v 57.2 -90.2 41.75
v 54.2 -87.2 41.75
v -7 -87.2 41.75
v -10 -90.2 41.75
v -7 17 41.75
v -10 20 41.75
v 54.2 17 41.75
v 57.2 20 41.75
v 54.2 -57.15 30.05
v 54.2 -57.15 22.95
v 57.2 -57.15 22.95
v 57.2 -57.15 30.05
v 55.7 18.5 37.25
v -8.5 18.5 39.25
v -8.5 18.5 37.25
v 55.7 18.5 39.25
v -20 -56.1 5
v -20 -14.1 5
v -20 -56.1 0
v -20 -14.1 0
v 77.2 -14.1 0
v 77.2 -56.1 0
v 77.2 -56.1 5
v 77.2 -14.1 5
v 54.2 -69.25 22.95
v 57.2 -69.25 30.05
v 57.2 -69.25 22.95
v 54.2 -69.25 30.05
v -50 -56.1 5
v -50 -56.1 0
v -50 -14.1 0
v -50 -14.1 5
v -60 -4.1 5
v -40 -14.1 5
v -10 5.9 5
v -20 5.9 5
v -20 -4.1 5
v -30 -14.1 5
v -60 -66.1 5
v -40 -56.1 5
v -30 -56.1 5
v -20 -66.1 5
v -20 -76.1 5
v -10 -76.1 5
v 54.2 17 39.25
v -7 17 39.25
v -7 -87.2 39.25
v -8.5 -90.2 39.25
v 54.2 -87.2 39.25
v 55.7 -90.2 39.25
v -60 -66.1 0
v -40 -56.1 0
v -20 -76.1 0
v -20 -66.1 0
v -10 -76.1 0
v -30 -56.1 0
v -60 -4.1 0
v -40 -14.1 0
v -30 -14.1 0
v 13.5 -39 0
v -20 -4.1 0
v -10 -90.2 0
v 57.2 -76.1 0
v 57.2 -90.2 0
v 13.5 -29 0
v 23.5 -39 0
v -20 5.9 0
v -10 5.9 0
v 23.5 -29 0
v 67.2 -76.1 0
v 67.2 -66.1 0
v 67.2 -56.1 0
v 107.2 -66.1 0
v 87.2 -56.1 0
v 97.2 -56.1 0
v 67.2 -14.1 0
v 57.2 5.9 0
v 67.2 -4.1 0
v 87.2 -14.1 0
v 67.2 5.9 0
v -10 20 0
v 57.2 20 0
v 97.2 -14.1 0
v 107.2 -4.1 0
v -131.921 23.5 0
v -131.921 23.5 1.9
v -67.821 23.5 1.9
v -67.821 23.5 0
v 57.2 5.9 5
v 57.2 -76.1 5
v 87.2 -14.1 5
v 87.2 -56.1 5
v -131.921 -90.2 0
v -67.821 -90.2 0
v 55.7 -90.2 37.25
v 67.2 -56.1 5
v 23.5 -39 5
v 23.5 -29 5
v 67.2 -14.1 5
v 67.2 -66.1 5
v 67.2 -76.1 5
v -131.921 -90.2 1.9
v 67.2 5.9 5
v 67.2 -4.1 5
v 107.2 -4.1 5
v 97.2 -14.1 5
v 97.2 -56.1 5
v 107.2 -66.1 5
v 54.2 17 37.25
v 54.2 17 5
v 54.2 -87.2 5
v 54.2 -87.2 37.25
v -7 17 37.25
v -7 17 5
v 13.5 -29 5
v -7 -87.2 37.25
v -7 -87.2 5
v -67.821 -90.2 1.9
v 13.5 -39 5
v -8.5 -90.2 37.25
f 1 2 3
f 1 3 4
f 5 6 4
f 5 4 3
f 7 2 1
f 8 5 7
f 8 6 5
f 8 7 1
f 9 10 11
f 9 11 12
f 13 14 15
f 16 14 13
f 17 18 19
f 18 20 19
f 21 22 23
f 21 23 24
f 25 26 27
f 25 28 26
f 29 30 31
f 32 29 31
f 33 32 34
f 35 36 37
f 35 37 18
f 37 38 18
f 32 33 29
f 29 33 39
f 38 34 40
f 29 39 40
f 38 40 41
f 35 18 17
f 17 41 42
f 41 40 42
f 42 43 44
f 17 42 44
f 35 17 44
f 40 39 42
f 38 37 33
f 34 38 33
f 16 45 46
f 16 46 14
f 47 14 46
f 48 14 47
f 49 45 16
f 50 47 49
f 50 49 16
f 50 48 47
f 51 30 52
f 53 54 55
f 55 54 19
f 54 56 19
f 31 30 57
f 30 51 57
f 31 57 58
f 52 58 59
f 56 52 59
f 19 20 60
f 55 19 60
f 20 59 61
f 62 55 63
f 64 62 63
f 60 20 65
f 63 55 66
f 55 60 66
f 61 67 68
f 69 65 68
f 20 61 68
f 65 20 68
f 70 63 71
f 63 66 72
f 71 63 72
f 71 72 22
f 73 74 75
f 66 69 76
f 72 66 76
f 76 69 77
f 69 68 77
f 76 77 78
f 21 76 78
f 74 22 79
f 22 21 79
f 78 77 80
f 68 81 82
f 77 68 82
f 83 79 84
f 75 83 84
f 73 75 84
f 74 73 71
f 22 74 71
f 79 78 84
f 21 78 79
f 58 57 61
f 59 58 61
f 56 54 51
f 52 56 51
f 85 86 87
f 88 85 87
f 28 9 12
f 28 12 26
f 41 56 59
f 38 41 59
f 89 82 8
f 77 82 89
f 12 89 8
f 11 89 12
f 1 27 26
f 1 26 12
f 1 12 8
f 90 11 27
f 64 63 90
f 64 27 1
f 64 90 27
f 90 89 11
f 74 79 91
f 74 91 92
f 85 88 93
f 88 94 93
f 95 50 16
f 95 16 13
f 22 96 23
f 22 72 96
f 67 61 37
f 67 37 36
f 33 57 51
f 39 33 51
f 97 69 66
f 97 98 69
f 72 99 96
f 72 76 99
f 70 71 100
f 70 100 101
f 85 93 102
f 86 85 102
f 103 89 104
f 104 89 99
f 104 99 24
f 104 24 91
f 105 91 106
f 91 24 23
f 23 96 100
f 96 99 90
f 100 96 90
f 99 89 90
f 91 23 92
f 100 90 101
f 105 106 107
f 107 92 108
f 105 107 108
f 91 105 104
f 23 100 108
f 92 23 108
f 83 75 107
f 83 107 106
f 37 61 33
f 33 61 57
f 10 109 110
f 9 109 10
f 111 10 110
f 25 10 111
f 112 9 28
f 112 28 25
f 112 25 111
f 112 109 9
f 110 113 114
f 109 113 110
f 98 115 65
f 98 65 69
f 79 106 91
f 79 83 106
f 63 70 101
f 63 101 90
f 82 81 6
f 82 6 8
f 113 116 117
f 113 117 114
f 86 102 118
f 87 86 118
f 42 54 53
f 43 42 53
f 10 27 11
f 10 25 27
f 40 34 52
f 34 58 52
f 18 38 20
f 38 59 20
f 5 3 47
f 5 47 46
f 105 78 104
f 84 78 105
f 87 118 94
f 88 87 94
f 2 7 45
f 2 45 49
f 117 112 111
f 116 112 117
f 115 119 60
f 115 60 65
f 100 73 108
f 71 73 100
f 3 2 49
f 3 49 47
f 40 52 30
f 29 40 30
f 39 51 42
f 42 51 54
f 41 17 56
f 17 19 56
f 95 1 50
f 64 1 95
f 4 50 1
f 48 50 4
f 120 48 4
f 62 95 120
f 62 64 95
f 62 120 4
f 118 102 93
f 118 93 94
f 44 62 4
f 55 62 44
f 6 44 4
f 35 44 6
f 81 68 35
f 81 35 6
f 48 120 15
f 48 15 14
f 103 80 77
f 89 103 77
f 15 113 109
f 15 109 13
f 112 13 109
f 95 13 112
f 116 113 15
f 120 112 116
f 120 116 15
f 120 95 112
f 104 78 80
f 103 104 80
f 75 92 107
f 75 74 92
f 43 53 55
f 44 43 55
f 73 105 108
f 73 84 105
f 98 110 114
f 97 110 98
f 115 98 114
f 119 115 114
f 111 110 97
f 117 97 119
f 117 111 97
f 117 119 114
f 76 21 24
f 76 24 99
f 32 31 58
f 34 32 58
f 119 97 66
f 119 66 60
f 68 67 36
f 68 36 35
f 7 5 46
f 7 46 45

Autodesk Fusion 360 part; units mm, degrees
sketch "Sketch1" plane through (0, 0, 0) normal (0, 0, 1) x (1, 0, 0)
  line L0 (-10, 20) -> (57.2, 20)
  line L1 (57.2, 20) -> (57.2, -90.2)
  line L2 (57.2, -90.2) -> (-10, -90.2)
  line L3 (-10, -90.2) -> (-10, 20)
  dimension "d1" = 67.2
  dimension "d2" = 110.2
extrude "Extrude1" add sketch "Sketch1" along normal blind 41.75 makes body 1
sketch "Sketch2" plane through (0, 0, 41.75) normal (0, 0, 1) x (-1, 0, 0)
  line L0 (10, 90.2) -> (-57.2, 90.2)
  line L1 (-57.2, 90.2) -> (-57.2, -20)
  line L2 (-57.2, -20) -> (10, -20)
  line L3 (10, -20) -> (10, 90.2)
  line L4 (7, -17) -> (-54.2, -17)
  line L5 (-54.2, -17) -> (-54.2, 87.2)
  line L6 (-54.2, 87.2) -> (7, 87.2)
  line L7 (7, 87.2) -> (7, -17)
  dimension "d10" = 61.2
  dimension "d11" = 104.2
  dimension "d12" = 3
  dimension "d13" = 3
extrude "Extrude3" cut sketch "Sketch2" against normal blind 36.75 contours L4 L5 L6 L7 bodies 1
sketch "Sketch4" plane through (0, -90.2, 0) normal (0, -1, 0) x (1, 0, 0)
  line L0 (-10, 0) -> (57.2, 0)
  line L1 (57.2, 0) -> (57.2, 41.75)
  line L2 (57.2, 41.75) -> (-10, 41.75)
  line L3 (-10, 41.75) -> (-10, 0)
  line L4 (-8.5, 39.25) -> (55.7, 39.25)
  line L5 (55.7, 39.25) -> (55.7, 37.25)
  line L6 (55.7, 37.25) -> (-8.5, 37.25)
  line L7 (-8.5, 37.25) -> (-8.5, 39.25)
  line L8 (54.2, 41.75) -> (-7, 41.75)
  line L9 (-131.921, 1.9) -> (-67.821, 1.9)
  line L10 (-67.821, 1.9) -> (-67.821, 0)
  line L11 (-67.821, 0) -> (-131.921, 0)
  line L12 (-131.921, 0) -> (-131.921, 1.9)
  dimension "d22" = 64.2
  dimension "d23" = 2
  dimension "d24" = 2.5
  dimension "d25" = 1.5
  dimension "d40" = 1.9
  dimension "d41" = 64.1
extrude "Extrude4" cut sketch "Sketch4" against normal blind 108.7 contours L4 L5 L6 L7 bodies 1
extrude "Extrude6" add sketch "Sketch4" against normal blind 113.7 separate body contours L9 L10 L11 L12 makes body 2
sketch "Sketch5" plane through (0, 0, 0) normal (0, 0, -1) x (1, 0, 0)
  line L0 (57.2, 90.2) -> (-10, 90.2)
  line L1 (-10, 90.2) -> (-10, -20)
  line L2 (-10, -20) -> (57.2, -20)
  line L3 (-10, 4.1) -> (-60, 4.1)
  line L4 (-60, 4.1) -> (-60, 66.1)
  line L5 (-60, 66.1) -> (-10, 66.1)
  line L6 (-10, 66.1) -> (-10, 4.1)
  line L7 (57.2, -20) -> (-10, -20)
  line L8 (-50, 14.1) -> (-40, 14.1)
  line L9 (-40, 14.1) -> (-40, 56.1)
  line L10 (-40, 56.1) -> (-50, 56.1)
  line L11 (-50, 56.1) -> (-50, 14.1)
  line L12 (-30, 14.1) -> (-20, 14.1)
  line L13 (-20, 14.1) -> (-20, 56.1)
  line L14 (-20, 56.1) -> (-30, 56.1)
  line L15 (-30, 56.1) -> (-30, 14.1)
  line L16 (23.6, -15.6534) -> (23.6, 85)
  line L17 (-10, -20) -> (-10, 90.2)
  line L18 (87.2, 14.1) -> (87.2, 56.1)
  line L19 (77.2, 56.1) -> (77.2, 14.1)
  line L20 (77.2, 14.1) -> (67.2, 14.1)
  line L21 (57.2, 4.1) -> (107.2, 4.1)
  line L22 (87.2, 56.1) -> (97.2, 56.1)
  line L23 (67.2, 14.1) -> (67.2, 56.1)
  line L24 (57.2, 66.1) -> (57.2, 4.1)
  line L25 (67.2, 56.1) -> (77.2, 56.1)
  line L26 (107.2, 4.1) -> (107.2, 66.1)
  line L27 (97.2, 56.1) -> (97.2, 14.1)
  line L28 (107.2, 66.1) -> (57.2, 66.1)
  line L29 (97.2, 14.1) -> (87.2, 14.1)
  line L30 (-10, 4.1) -> (-20, 4.1)
  line L31 (-20, 4.1) -> (-20, -5.9)
  line L32 (-20, -5.9) -> (-10, -5.9)
  line L33 (-10, -5.9) -> (-10, 4.1)
  line L34 (-10, 66.1) -> (-20, 66.1)
  line L35 (-20, 66.1) -> (-20, 76.1)
  line L36 (-20, 76.1) -> (-10, 76.1)
  line L37 (-10, 76.1) -> (-10, 66.1)
  line L38 (87.2, 56.1) -> (97.2, 56.1)
  line L39 (67.2, 76.1) -> (57.2, 76.1)
  line L40 (57.2, 66.1) -> (67.2, 66.1)
  line L41 (87.2, 14.1) -> (87.2, 56.1)
  line L42 (57.2, 4.1) -> (107.2, 4.1)
  line L43 (67.2, -5.9) -> (57.2, -5.9)
  line L44 (97.2, 14.1) -> (87.2, 14.1)
  line L45 (77.2, 56.1) -> (77.2, 14.1)
  line L46 (67.2, 66.1) -> (67.2, 76.1)
  line L47 (57.2, 4.1) -> (67.2, 4.1)
  line L48 (77.2, 14.1) -> (67.2, 14.1)
  line L49 (107.2, 66.1) -> (57.2, 66.1)
  line L50 (57.2, 66.1) -> (57.2, 4.1)
  line L51 (57.2, -5.9) -> (57.2, 4.1)
  line L52 (67.2, 56.1) -> (77.2, 56.1)
  line L53 (67.2, 14.1) -> (67.2, 56.1)
  line L54 (97.2, 56.1) -> (97.2, 14.1)
  line L55 (57.2, 76.1) -> (57.2, 66.1)
  line L56 (67.2, 4.1) -> (67.2, -5.9)
  dimension "d28" = 24.1
  dimension "d29" = 62
  dimension "d30" = 50
  dimension "d31" = 42
  dimension "d32" = 10
  dimension "d34" = 10
  dimension "d35" = 10
  dimension "d36" = 10
  dimension "d37" = 33.6
  dimension "d44" = 10
  dimension "d45" = 10
  dimension "d46" = 10
  dimension "d47" = 10
extrude "Extrude5" add sketch "Sketch5" against normal blind 5 bodies 1
sketch "Sketch7" plane through (0, 0, 5) normal (0, 0, 1) x (-1, 0, 0)
  line L0 (7, 87.2) -> (-54.2, 87.2)
  line L1 (-54.2, 87.2) -> (-54.2, -17)
  line L2 (-54.2, -17) -> (7, -17)
  line L3 (7, -17) -> (7, 87.2)
  line L4 (-13.5, 29) -> (-23.5, 29)
  line L5 (-23.5, 29) -> (-23.5, 39)
  line L6 (-23.5, 39) -> (-13.5, 39)
  line L7 (-13.5, 39) -> (-13.5, 29)
  dimension "d48" = 46
  dimension "d49" = 20.5
  dimension "d50" = 10
  dimension "d51" = 10
extrude "Extrude7" cut sketch "Sketch7" against normal blind 5 contours L4 L5 L6 L7 bodies 1
sketch "Sketch8" plane through (54.2, 0, 0) normal (-1, 0, 0) x (0, -1, 0)
  line L0 (87.2, 37.25) -> (-17, 37.25)
  line L1 (-17, 37.25) -> (-17, 5)
  line L2 (-17, 5) -> (87.2, 5)
  line L3 (87.2, 5) -> (87.2, 37.25)
  line L4 (57.15, 30.05) -> (69.25, 30.05)
  line L5 (69.25, 30.05) -> (69.25, 22.95)
  line L6 (69.25, 22.95) -> (57.15, 22.95)
  line L7 (57.15, 22.95) -> (57.15, 30.05)
  dimension "d54" = 17.95
  dimension "d55" = 17.95
  dimension "d56" = 12.1
  dimension "d57" = 7.1
extrude "Extrude8" cut sketch "Sketch8" against normal blind 3 contours L4 L5 L6 L7 bodies 1
equation "d40 = 2 mm - 0.1 mm"
equation "d41 = 64.2 mm - 0.1 mm"
equation "d54 = 1.8 cm - 0.05 mm"
equation "d55 = 18 mm - 0.05 mm"
equation "d56 = 1.2 cm + 0.1 mm"
equation "d57 = 7 mm + 0.1 mm"
